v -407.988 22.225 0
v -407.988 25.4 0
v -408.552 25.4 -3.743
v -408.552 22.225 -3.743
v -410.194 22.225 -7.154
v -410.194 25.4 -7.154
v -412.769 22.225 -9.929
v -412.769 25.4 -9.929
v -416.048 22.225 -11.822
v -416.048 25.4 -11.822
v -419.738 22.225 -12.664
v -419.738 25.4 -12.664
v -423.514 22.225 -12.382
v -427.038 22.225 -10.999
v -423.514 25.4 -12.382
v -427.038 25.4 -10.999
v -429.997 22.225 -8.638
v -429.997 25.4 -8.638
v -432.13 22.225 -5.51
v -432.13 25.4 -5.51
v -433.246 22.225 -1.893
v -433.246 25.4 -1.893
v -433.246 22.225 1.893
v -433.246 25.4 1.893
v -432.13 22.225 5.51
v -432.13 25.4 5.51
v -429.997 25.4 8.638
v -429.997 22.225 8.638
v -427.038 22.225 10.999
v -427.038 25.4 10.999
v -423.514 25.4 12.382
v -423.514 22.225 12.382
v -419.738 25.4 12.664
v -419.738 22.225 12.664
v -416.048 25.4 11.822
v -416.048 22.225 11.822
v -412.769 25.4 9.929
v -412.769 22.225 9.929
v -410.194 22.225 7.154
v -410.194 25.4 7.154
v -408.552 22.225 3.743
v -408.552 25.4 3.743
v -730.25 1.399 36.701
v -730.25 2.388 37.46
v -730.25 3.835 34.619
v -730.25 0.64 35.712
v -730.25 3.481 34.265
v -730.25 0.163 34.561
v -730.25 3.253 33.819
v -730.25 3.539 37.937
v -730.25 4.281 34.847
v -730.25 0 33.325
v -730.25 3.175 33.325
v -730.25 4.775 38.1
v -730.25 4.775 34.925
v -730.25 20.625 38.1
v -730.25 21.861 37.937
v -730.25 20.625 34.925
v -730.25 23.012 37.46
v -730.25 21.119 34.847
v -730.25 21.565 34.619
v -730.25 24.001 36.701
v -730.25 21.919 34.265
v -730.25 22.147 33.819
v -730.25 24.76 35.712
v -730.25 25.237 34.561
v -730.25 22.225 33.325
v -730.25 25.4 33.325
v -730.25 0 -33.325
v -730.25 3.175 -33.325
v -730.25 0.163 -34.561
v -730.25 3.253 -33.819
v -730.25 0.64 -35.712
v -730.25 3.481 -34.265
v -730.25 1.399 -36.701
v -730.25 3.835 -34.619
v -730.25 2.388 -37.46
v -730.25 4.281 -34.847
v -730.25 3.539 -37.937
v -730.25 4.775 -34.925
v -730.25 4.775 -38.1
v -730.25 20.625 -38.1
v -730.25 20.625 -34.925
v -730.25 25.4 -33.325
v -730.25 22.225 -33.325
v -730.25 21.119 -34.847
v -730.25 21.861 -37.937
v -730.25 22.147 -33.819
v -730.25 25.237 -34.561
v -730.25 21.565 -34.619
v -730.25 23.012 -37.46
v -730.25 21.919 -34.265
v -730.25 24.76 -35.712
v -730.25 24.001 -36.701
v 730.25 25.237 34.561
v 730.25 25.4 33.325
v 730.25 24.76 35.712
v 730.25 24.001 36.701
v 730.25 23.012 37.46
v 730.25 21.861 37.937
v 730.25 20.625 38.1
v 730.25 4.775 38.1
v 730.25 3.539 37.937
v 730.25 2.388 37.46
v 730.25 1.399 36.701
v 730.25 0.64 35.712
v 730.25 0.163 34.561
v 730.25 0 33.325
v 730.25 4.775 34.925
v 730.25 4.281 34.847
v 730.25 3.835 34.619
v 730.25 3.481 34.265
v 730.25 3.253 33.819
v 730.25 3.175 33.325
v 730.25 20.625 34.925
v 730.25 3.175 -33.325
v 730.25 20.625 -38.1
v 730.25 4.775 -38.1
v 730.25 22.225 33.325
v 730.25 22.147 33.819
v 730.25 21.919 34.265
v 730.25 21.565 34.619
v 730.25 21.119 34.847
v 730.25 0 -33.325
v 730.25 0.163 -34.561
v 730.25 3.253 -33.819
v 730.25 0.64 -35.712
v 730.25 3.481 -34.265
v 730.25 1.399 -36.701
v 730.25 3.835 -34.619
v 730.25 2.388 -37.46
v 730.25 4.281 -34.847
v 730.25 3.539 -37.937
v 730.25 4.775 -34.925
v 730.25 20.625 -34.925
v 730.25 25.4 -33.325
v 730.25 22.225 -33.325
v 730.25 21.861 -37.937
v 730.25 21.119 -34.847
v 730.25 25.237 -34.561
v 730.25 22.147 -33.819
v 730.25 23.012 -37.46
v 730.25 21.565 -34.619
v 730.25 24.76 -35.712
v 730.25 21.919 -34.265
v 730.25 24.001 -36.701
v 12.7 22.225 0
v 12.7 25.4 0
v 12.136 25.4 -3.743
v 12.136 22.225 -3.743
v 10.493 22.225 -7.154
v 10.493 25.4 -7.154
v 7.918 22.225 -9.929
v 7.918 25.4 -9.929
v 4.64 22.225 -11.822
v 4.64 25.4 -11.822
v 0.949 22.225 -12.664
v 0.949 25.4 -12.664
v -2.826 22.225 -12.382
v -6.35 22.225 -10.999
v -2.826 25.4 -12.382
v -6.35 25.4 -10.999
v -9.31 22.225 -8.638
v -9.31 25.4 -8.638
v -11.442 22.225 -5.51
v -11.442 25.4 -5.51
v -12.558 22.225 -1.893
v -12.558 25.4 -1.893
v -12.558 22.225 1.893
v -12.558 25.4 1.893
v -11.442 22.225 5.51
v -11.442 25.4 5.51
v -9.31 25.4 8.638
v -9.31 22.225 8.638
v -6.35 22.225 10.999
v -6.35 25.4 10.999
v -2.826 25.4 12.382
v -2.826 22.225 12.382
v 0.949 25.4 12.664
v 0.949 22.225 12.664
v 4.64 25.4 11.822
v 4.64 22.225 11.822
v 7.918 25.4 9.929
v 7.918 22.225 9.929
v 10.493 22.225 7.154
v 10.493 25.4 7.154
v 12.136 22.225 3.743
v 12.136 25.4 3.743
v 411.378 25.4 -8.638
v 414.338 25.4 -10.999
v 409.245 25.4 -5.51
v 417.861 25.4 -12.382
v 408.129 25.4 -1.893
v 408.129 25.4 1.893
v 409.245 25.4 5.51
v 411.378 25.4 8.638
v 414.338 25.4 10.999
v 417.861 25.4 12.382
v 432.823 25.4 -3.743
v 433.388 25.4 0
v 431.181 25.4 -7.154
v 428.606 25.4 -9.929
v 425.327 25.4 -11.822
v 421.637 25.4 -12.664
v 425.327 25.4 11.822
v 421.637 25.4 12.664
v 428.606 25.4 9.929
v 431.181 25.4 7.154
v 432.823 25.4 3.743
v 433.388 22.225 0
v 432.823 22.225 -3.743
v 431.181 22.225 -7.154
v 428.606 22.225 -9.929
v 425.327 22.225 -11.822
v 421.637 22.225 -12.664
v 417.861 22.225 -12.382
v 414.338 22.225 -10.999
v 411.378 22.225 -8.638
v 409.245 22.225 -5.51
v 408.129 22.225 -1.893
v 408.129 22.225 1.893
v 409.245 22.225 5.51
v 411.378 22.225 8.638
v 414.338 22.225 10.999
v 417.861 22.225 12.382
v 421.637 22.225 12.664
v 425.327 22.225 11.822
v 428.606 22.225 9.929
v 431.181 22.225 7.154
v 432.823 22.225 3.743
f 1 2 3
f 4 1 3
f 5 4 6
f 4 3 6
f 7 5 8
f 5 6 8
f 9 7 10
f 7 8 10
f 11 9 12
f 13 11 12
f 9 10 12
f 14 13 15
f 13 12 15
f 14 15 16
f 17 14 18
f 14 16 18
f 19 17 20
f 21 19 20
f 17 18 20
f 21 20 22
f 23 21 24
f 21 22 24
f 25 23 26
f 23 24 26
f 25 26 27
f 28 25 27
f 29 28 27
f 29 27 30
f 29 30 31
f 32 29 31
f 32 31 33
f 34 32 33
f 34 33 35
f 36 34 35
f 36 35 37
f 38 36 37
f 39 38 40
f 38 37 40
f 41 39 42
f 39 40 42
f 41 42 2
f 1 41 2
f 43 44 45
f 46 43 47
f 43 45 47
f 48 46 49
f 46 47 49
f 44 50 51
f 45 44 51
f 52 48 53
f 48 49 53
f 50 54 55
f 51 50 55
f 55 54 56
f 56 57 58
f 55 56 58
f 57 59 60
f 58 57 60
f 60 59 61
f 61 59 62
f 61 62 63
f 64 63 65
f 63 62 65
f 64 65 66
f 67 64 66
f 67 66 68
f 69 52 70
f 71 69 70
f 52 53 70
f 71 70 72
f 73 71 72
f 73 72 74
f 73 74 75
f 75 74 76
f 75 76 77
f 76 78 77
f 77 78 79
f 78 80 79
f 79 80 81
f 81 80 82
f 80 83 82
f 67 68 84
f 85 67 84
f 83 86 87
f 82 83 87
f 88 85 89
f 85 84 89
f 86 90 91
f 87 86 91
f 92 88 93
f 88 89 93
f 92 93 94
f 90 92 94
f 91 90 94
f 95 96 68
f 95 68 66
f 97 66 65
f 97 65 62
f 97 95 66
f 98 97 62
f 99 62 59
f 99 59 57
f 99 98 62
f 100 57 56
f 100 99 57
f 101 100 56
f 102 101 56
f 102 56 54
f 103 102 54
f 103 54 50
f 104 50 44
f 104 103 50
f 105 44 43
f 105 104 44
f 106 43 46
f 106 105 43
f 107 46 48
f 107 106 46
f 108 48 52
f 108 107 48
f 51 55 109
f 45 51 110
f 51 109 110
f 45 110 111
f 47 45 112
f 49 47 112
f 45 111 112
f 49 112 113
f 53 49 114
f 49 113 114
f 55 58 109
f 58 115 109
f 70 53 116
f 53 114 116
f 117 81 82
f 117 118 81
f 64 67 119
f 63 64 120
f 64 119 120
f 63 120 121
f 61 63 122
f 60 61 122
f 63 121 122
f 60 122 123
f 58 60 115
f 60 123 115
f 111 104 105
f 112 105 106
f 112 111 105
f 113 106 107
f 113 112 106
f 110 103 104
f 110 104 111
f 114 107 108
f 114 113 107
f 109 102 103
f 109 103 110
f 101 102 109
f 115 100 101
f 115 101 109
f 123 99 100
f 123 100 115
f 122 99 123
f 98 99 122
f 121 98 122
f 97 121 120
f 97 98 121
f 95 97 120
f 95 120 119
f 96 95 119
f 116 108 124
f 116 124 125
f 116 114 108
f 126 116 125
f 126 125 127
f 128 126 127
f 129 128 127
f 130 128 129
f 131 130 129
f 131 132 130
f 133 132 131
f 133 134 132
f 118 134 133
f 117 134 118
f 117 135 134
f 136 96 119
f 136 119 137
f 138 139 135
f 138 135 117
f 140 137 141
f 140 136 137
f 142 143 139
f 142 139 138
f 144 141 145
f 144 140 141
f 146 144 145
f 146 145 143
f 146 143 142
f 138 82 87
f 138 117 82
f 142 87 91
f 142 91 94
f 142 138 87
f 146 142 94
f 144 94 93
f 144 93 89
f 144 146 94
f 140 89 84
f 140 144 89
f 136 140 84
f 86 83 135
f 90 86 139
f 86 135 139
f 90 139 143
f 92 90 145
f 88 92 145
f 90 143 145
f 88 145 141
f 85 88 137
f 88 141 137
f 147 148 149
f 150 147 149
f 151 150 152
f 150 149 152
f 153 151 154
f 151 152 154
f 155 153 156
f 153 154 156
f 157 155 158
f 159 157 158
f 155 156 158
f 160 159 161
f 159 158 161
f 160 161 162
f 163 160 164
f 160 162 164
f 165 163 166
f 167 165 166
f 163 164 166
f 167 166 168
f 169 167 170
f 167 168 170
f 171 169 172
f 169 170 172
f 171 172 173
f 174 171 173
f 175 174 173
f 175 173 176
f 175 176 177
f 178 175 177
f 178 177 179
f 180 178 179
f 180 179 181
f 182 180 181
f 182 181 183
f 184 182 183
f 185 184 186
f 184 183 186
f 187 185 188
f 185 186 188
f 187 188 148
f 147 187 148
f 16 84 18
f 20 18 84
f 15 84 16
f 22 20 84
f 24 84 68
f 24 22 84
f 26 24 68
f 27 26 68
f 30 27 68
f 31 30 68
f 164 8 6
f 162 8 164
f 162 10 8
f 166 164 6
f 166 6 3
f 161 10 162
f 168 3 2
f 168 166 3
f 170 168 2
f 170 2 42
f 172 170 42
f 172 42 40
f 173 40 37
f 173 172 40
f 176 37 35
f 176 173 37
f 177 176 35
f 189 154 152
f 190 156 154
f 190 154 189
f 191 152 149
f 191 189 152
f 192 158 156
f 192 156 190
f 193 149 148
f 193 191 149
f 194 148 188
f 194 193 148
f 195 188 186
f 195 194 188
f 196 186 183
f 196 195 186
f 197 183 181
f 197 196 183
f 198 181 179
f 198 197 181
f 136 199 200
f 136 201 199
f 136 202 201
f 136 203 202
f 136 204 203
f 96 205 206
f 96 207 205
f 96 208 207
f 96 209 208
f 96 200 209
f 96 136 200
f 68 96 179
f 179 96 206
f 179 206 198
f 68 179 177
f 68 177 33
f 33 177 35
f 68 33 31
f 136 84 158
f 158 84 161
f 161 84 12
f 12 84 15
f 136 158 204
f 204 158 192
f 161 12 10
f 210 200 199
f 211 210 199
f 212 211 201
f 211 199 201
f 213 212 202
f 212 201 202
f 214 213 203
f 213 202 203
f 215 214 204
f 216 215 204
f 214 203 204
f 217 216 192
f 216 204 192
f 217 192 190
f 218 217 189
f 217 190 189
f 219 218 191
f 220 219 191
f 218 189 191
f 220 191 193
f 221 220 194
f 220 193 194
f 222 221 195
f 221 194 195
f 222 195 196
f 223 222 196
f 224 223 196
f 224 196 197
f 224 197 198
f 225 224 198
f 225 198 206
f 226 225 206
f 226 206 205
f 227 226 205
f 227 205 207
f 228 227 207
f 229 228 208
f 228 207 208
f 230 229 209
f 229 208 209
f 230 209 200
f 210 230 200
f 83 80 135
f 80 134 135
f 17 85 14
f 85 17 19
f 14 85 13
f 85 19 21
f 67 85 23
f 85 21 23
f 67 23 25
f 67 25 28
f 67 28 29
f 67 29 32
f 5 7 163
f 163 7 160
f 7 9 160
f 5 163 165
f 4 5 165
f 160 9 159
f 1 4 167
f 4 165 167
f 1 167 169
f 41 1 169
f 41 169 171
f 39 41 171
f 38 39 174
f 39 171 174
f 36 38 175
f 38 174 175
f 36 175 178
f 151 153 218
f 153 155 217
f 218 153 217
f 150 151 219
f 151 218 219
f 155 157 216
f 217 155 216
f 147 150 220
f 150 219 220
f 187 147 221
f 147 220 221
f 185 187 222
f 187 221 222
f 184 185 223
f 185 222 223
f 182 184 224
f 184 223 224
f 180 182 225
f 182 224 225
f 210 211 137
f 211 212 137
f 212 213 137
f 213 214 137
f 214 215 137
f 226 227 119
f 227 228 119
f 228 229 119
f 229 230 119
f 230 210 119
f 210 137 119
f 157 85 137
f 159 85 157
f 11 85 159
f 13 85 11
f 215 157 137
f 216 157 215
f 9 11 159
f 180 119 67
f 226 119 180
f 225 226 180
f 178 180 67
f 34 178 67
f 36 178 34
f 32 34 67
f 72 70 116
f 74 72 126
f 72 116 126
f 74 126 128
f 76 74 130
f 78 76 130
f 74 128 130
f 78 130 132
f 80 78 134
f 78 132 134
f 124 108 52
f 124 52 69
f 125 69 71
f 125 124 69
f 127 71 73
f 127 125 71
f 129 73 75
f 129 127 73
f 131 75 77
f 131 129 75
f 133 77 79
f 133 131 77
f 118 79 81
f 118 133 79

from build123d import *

# Parameters (mm, degrees)
BOSS_EXTRUDE1_DEPTH = 730.25
SKETCH2_R           = 12.7
CUT_EXTRUDE1_DEPTH  = 3.175
LPATTERN1_COUNT     = 3
LPATTERN1_PITCH     = 420.6875


with BuildPart() as part:
    # Sketch1 → Boss-Extrude1 (new body, symmetric)
    with BuildSketch(Plane(origin=(0, 0, 0), x_dir=(0, 0, -1), z_dir=(1, 0, 0))):
        with BuildLine():
            Line((33.3248, 25.4), (-33.3248, 25.4))
            ThreePointArc((-33.3248, 25.4), (-36.701376302, 24.001376302), (-38.1, 20.6248))
            Line((-38.1, 20.6248), (-38.1, 4.7752))
            ThreePointArc((-38.1, 4.7752), (-36.701376302, 1.398623698), (-33.3248, 0))
            Line((-33.3248, 0), (33.3248, 0))
            ThreePointArc((33.3248, 0), (36.701376302, 1.398623698), (38.1, 4.7752))
            Line((38.1, 4.7752), (38.1, 20.6248))
            ThreePointArc((38.1, 20.6248), (36.701376302, 24.001376302), (33.3248, 25.4))
        make_face()
        with BuildLine():
            Line((33.3248, 22.225), (-33.3248, 22.225))
            ThreePointArc((-33.3248, 22.225), (-34.456312271, 21.756312271), (-34.925, 20.6248))
            Line((-34.925, 20.6248), (-34.925, 4.7752))
            ThreePointArc((-34.925, 4.7752), (-34.456312271, 3.643687729), (-33.3248, 3.175))
            Line((-33.3248, 3.175), (33.3248, 3.175))
            ThreePointArc((33.3248, 3.175), (34.456312271, 3.643687729), (34.925, 4.7752))
            Line((34.925, 4.7752), (34.925, 20.6248))
            ThreePointArc((34.925, 20.6248), (34.456312271, 21.756312271), (33.3248, 22.225))
        make_face(mode=Mode.SUBTRACT)
    extrude(amount=BOSS_EXTRUDE1_DEPTH, both=True)

    # Sketch2 → Cut-Extrude1 (cut)
    with BuildSketch(Plane(origin=(0, 25.4, 0), x_dir=(1, 0, 0), z_dir=(0, 1, 0))):
        with Locations((-420.6875, 0)):
            Circle(SKETCH2_R)
    cut_extrude1 = extrude(amount=-CUT_EXTRUDE1_DEPTH, mode=Mode.SUBTRACT)

    # LPattern1: Cut-Extrude1 ×3
    with Locations(*[(i * LPATTERN1_PITCH, 0, 0) for i in range(1, LPATTERN1_COUNT)]):
        add(cut_extrude1, mode=Mode.SUBTRACT)


solid = part.part
